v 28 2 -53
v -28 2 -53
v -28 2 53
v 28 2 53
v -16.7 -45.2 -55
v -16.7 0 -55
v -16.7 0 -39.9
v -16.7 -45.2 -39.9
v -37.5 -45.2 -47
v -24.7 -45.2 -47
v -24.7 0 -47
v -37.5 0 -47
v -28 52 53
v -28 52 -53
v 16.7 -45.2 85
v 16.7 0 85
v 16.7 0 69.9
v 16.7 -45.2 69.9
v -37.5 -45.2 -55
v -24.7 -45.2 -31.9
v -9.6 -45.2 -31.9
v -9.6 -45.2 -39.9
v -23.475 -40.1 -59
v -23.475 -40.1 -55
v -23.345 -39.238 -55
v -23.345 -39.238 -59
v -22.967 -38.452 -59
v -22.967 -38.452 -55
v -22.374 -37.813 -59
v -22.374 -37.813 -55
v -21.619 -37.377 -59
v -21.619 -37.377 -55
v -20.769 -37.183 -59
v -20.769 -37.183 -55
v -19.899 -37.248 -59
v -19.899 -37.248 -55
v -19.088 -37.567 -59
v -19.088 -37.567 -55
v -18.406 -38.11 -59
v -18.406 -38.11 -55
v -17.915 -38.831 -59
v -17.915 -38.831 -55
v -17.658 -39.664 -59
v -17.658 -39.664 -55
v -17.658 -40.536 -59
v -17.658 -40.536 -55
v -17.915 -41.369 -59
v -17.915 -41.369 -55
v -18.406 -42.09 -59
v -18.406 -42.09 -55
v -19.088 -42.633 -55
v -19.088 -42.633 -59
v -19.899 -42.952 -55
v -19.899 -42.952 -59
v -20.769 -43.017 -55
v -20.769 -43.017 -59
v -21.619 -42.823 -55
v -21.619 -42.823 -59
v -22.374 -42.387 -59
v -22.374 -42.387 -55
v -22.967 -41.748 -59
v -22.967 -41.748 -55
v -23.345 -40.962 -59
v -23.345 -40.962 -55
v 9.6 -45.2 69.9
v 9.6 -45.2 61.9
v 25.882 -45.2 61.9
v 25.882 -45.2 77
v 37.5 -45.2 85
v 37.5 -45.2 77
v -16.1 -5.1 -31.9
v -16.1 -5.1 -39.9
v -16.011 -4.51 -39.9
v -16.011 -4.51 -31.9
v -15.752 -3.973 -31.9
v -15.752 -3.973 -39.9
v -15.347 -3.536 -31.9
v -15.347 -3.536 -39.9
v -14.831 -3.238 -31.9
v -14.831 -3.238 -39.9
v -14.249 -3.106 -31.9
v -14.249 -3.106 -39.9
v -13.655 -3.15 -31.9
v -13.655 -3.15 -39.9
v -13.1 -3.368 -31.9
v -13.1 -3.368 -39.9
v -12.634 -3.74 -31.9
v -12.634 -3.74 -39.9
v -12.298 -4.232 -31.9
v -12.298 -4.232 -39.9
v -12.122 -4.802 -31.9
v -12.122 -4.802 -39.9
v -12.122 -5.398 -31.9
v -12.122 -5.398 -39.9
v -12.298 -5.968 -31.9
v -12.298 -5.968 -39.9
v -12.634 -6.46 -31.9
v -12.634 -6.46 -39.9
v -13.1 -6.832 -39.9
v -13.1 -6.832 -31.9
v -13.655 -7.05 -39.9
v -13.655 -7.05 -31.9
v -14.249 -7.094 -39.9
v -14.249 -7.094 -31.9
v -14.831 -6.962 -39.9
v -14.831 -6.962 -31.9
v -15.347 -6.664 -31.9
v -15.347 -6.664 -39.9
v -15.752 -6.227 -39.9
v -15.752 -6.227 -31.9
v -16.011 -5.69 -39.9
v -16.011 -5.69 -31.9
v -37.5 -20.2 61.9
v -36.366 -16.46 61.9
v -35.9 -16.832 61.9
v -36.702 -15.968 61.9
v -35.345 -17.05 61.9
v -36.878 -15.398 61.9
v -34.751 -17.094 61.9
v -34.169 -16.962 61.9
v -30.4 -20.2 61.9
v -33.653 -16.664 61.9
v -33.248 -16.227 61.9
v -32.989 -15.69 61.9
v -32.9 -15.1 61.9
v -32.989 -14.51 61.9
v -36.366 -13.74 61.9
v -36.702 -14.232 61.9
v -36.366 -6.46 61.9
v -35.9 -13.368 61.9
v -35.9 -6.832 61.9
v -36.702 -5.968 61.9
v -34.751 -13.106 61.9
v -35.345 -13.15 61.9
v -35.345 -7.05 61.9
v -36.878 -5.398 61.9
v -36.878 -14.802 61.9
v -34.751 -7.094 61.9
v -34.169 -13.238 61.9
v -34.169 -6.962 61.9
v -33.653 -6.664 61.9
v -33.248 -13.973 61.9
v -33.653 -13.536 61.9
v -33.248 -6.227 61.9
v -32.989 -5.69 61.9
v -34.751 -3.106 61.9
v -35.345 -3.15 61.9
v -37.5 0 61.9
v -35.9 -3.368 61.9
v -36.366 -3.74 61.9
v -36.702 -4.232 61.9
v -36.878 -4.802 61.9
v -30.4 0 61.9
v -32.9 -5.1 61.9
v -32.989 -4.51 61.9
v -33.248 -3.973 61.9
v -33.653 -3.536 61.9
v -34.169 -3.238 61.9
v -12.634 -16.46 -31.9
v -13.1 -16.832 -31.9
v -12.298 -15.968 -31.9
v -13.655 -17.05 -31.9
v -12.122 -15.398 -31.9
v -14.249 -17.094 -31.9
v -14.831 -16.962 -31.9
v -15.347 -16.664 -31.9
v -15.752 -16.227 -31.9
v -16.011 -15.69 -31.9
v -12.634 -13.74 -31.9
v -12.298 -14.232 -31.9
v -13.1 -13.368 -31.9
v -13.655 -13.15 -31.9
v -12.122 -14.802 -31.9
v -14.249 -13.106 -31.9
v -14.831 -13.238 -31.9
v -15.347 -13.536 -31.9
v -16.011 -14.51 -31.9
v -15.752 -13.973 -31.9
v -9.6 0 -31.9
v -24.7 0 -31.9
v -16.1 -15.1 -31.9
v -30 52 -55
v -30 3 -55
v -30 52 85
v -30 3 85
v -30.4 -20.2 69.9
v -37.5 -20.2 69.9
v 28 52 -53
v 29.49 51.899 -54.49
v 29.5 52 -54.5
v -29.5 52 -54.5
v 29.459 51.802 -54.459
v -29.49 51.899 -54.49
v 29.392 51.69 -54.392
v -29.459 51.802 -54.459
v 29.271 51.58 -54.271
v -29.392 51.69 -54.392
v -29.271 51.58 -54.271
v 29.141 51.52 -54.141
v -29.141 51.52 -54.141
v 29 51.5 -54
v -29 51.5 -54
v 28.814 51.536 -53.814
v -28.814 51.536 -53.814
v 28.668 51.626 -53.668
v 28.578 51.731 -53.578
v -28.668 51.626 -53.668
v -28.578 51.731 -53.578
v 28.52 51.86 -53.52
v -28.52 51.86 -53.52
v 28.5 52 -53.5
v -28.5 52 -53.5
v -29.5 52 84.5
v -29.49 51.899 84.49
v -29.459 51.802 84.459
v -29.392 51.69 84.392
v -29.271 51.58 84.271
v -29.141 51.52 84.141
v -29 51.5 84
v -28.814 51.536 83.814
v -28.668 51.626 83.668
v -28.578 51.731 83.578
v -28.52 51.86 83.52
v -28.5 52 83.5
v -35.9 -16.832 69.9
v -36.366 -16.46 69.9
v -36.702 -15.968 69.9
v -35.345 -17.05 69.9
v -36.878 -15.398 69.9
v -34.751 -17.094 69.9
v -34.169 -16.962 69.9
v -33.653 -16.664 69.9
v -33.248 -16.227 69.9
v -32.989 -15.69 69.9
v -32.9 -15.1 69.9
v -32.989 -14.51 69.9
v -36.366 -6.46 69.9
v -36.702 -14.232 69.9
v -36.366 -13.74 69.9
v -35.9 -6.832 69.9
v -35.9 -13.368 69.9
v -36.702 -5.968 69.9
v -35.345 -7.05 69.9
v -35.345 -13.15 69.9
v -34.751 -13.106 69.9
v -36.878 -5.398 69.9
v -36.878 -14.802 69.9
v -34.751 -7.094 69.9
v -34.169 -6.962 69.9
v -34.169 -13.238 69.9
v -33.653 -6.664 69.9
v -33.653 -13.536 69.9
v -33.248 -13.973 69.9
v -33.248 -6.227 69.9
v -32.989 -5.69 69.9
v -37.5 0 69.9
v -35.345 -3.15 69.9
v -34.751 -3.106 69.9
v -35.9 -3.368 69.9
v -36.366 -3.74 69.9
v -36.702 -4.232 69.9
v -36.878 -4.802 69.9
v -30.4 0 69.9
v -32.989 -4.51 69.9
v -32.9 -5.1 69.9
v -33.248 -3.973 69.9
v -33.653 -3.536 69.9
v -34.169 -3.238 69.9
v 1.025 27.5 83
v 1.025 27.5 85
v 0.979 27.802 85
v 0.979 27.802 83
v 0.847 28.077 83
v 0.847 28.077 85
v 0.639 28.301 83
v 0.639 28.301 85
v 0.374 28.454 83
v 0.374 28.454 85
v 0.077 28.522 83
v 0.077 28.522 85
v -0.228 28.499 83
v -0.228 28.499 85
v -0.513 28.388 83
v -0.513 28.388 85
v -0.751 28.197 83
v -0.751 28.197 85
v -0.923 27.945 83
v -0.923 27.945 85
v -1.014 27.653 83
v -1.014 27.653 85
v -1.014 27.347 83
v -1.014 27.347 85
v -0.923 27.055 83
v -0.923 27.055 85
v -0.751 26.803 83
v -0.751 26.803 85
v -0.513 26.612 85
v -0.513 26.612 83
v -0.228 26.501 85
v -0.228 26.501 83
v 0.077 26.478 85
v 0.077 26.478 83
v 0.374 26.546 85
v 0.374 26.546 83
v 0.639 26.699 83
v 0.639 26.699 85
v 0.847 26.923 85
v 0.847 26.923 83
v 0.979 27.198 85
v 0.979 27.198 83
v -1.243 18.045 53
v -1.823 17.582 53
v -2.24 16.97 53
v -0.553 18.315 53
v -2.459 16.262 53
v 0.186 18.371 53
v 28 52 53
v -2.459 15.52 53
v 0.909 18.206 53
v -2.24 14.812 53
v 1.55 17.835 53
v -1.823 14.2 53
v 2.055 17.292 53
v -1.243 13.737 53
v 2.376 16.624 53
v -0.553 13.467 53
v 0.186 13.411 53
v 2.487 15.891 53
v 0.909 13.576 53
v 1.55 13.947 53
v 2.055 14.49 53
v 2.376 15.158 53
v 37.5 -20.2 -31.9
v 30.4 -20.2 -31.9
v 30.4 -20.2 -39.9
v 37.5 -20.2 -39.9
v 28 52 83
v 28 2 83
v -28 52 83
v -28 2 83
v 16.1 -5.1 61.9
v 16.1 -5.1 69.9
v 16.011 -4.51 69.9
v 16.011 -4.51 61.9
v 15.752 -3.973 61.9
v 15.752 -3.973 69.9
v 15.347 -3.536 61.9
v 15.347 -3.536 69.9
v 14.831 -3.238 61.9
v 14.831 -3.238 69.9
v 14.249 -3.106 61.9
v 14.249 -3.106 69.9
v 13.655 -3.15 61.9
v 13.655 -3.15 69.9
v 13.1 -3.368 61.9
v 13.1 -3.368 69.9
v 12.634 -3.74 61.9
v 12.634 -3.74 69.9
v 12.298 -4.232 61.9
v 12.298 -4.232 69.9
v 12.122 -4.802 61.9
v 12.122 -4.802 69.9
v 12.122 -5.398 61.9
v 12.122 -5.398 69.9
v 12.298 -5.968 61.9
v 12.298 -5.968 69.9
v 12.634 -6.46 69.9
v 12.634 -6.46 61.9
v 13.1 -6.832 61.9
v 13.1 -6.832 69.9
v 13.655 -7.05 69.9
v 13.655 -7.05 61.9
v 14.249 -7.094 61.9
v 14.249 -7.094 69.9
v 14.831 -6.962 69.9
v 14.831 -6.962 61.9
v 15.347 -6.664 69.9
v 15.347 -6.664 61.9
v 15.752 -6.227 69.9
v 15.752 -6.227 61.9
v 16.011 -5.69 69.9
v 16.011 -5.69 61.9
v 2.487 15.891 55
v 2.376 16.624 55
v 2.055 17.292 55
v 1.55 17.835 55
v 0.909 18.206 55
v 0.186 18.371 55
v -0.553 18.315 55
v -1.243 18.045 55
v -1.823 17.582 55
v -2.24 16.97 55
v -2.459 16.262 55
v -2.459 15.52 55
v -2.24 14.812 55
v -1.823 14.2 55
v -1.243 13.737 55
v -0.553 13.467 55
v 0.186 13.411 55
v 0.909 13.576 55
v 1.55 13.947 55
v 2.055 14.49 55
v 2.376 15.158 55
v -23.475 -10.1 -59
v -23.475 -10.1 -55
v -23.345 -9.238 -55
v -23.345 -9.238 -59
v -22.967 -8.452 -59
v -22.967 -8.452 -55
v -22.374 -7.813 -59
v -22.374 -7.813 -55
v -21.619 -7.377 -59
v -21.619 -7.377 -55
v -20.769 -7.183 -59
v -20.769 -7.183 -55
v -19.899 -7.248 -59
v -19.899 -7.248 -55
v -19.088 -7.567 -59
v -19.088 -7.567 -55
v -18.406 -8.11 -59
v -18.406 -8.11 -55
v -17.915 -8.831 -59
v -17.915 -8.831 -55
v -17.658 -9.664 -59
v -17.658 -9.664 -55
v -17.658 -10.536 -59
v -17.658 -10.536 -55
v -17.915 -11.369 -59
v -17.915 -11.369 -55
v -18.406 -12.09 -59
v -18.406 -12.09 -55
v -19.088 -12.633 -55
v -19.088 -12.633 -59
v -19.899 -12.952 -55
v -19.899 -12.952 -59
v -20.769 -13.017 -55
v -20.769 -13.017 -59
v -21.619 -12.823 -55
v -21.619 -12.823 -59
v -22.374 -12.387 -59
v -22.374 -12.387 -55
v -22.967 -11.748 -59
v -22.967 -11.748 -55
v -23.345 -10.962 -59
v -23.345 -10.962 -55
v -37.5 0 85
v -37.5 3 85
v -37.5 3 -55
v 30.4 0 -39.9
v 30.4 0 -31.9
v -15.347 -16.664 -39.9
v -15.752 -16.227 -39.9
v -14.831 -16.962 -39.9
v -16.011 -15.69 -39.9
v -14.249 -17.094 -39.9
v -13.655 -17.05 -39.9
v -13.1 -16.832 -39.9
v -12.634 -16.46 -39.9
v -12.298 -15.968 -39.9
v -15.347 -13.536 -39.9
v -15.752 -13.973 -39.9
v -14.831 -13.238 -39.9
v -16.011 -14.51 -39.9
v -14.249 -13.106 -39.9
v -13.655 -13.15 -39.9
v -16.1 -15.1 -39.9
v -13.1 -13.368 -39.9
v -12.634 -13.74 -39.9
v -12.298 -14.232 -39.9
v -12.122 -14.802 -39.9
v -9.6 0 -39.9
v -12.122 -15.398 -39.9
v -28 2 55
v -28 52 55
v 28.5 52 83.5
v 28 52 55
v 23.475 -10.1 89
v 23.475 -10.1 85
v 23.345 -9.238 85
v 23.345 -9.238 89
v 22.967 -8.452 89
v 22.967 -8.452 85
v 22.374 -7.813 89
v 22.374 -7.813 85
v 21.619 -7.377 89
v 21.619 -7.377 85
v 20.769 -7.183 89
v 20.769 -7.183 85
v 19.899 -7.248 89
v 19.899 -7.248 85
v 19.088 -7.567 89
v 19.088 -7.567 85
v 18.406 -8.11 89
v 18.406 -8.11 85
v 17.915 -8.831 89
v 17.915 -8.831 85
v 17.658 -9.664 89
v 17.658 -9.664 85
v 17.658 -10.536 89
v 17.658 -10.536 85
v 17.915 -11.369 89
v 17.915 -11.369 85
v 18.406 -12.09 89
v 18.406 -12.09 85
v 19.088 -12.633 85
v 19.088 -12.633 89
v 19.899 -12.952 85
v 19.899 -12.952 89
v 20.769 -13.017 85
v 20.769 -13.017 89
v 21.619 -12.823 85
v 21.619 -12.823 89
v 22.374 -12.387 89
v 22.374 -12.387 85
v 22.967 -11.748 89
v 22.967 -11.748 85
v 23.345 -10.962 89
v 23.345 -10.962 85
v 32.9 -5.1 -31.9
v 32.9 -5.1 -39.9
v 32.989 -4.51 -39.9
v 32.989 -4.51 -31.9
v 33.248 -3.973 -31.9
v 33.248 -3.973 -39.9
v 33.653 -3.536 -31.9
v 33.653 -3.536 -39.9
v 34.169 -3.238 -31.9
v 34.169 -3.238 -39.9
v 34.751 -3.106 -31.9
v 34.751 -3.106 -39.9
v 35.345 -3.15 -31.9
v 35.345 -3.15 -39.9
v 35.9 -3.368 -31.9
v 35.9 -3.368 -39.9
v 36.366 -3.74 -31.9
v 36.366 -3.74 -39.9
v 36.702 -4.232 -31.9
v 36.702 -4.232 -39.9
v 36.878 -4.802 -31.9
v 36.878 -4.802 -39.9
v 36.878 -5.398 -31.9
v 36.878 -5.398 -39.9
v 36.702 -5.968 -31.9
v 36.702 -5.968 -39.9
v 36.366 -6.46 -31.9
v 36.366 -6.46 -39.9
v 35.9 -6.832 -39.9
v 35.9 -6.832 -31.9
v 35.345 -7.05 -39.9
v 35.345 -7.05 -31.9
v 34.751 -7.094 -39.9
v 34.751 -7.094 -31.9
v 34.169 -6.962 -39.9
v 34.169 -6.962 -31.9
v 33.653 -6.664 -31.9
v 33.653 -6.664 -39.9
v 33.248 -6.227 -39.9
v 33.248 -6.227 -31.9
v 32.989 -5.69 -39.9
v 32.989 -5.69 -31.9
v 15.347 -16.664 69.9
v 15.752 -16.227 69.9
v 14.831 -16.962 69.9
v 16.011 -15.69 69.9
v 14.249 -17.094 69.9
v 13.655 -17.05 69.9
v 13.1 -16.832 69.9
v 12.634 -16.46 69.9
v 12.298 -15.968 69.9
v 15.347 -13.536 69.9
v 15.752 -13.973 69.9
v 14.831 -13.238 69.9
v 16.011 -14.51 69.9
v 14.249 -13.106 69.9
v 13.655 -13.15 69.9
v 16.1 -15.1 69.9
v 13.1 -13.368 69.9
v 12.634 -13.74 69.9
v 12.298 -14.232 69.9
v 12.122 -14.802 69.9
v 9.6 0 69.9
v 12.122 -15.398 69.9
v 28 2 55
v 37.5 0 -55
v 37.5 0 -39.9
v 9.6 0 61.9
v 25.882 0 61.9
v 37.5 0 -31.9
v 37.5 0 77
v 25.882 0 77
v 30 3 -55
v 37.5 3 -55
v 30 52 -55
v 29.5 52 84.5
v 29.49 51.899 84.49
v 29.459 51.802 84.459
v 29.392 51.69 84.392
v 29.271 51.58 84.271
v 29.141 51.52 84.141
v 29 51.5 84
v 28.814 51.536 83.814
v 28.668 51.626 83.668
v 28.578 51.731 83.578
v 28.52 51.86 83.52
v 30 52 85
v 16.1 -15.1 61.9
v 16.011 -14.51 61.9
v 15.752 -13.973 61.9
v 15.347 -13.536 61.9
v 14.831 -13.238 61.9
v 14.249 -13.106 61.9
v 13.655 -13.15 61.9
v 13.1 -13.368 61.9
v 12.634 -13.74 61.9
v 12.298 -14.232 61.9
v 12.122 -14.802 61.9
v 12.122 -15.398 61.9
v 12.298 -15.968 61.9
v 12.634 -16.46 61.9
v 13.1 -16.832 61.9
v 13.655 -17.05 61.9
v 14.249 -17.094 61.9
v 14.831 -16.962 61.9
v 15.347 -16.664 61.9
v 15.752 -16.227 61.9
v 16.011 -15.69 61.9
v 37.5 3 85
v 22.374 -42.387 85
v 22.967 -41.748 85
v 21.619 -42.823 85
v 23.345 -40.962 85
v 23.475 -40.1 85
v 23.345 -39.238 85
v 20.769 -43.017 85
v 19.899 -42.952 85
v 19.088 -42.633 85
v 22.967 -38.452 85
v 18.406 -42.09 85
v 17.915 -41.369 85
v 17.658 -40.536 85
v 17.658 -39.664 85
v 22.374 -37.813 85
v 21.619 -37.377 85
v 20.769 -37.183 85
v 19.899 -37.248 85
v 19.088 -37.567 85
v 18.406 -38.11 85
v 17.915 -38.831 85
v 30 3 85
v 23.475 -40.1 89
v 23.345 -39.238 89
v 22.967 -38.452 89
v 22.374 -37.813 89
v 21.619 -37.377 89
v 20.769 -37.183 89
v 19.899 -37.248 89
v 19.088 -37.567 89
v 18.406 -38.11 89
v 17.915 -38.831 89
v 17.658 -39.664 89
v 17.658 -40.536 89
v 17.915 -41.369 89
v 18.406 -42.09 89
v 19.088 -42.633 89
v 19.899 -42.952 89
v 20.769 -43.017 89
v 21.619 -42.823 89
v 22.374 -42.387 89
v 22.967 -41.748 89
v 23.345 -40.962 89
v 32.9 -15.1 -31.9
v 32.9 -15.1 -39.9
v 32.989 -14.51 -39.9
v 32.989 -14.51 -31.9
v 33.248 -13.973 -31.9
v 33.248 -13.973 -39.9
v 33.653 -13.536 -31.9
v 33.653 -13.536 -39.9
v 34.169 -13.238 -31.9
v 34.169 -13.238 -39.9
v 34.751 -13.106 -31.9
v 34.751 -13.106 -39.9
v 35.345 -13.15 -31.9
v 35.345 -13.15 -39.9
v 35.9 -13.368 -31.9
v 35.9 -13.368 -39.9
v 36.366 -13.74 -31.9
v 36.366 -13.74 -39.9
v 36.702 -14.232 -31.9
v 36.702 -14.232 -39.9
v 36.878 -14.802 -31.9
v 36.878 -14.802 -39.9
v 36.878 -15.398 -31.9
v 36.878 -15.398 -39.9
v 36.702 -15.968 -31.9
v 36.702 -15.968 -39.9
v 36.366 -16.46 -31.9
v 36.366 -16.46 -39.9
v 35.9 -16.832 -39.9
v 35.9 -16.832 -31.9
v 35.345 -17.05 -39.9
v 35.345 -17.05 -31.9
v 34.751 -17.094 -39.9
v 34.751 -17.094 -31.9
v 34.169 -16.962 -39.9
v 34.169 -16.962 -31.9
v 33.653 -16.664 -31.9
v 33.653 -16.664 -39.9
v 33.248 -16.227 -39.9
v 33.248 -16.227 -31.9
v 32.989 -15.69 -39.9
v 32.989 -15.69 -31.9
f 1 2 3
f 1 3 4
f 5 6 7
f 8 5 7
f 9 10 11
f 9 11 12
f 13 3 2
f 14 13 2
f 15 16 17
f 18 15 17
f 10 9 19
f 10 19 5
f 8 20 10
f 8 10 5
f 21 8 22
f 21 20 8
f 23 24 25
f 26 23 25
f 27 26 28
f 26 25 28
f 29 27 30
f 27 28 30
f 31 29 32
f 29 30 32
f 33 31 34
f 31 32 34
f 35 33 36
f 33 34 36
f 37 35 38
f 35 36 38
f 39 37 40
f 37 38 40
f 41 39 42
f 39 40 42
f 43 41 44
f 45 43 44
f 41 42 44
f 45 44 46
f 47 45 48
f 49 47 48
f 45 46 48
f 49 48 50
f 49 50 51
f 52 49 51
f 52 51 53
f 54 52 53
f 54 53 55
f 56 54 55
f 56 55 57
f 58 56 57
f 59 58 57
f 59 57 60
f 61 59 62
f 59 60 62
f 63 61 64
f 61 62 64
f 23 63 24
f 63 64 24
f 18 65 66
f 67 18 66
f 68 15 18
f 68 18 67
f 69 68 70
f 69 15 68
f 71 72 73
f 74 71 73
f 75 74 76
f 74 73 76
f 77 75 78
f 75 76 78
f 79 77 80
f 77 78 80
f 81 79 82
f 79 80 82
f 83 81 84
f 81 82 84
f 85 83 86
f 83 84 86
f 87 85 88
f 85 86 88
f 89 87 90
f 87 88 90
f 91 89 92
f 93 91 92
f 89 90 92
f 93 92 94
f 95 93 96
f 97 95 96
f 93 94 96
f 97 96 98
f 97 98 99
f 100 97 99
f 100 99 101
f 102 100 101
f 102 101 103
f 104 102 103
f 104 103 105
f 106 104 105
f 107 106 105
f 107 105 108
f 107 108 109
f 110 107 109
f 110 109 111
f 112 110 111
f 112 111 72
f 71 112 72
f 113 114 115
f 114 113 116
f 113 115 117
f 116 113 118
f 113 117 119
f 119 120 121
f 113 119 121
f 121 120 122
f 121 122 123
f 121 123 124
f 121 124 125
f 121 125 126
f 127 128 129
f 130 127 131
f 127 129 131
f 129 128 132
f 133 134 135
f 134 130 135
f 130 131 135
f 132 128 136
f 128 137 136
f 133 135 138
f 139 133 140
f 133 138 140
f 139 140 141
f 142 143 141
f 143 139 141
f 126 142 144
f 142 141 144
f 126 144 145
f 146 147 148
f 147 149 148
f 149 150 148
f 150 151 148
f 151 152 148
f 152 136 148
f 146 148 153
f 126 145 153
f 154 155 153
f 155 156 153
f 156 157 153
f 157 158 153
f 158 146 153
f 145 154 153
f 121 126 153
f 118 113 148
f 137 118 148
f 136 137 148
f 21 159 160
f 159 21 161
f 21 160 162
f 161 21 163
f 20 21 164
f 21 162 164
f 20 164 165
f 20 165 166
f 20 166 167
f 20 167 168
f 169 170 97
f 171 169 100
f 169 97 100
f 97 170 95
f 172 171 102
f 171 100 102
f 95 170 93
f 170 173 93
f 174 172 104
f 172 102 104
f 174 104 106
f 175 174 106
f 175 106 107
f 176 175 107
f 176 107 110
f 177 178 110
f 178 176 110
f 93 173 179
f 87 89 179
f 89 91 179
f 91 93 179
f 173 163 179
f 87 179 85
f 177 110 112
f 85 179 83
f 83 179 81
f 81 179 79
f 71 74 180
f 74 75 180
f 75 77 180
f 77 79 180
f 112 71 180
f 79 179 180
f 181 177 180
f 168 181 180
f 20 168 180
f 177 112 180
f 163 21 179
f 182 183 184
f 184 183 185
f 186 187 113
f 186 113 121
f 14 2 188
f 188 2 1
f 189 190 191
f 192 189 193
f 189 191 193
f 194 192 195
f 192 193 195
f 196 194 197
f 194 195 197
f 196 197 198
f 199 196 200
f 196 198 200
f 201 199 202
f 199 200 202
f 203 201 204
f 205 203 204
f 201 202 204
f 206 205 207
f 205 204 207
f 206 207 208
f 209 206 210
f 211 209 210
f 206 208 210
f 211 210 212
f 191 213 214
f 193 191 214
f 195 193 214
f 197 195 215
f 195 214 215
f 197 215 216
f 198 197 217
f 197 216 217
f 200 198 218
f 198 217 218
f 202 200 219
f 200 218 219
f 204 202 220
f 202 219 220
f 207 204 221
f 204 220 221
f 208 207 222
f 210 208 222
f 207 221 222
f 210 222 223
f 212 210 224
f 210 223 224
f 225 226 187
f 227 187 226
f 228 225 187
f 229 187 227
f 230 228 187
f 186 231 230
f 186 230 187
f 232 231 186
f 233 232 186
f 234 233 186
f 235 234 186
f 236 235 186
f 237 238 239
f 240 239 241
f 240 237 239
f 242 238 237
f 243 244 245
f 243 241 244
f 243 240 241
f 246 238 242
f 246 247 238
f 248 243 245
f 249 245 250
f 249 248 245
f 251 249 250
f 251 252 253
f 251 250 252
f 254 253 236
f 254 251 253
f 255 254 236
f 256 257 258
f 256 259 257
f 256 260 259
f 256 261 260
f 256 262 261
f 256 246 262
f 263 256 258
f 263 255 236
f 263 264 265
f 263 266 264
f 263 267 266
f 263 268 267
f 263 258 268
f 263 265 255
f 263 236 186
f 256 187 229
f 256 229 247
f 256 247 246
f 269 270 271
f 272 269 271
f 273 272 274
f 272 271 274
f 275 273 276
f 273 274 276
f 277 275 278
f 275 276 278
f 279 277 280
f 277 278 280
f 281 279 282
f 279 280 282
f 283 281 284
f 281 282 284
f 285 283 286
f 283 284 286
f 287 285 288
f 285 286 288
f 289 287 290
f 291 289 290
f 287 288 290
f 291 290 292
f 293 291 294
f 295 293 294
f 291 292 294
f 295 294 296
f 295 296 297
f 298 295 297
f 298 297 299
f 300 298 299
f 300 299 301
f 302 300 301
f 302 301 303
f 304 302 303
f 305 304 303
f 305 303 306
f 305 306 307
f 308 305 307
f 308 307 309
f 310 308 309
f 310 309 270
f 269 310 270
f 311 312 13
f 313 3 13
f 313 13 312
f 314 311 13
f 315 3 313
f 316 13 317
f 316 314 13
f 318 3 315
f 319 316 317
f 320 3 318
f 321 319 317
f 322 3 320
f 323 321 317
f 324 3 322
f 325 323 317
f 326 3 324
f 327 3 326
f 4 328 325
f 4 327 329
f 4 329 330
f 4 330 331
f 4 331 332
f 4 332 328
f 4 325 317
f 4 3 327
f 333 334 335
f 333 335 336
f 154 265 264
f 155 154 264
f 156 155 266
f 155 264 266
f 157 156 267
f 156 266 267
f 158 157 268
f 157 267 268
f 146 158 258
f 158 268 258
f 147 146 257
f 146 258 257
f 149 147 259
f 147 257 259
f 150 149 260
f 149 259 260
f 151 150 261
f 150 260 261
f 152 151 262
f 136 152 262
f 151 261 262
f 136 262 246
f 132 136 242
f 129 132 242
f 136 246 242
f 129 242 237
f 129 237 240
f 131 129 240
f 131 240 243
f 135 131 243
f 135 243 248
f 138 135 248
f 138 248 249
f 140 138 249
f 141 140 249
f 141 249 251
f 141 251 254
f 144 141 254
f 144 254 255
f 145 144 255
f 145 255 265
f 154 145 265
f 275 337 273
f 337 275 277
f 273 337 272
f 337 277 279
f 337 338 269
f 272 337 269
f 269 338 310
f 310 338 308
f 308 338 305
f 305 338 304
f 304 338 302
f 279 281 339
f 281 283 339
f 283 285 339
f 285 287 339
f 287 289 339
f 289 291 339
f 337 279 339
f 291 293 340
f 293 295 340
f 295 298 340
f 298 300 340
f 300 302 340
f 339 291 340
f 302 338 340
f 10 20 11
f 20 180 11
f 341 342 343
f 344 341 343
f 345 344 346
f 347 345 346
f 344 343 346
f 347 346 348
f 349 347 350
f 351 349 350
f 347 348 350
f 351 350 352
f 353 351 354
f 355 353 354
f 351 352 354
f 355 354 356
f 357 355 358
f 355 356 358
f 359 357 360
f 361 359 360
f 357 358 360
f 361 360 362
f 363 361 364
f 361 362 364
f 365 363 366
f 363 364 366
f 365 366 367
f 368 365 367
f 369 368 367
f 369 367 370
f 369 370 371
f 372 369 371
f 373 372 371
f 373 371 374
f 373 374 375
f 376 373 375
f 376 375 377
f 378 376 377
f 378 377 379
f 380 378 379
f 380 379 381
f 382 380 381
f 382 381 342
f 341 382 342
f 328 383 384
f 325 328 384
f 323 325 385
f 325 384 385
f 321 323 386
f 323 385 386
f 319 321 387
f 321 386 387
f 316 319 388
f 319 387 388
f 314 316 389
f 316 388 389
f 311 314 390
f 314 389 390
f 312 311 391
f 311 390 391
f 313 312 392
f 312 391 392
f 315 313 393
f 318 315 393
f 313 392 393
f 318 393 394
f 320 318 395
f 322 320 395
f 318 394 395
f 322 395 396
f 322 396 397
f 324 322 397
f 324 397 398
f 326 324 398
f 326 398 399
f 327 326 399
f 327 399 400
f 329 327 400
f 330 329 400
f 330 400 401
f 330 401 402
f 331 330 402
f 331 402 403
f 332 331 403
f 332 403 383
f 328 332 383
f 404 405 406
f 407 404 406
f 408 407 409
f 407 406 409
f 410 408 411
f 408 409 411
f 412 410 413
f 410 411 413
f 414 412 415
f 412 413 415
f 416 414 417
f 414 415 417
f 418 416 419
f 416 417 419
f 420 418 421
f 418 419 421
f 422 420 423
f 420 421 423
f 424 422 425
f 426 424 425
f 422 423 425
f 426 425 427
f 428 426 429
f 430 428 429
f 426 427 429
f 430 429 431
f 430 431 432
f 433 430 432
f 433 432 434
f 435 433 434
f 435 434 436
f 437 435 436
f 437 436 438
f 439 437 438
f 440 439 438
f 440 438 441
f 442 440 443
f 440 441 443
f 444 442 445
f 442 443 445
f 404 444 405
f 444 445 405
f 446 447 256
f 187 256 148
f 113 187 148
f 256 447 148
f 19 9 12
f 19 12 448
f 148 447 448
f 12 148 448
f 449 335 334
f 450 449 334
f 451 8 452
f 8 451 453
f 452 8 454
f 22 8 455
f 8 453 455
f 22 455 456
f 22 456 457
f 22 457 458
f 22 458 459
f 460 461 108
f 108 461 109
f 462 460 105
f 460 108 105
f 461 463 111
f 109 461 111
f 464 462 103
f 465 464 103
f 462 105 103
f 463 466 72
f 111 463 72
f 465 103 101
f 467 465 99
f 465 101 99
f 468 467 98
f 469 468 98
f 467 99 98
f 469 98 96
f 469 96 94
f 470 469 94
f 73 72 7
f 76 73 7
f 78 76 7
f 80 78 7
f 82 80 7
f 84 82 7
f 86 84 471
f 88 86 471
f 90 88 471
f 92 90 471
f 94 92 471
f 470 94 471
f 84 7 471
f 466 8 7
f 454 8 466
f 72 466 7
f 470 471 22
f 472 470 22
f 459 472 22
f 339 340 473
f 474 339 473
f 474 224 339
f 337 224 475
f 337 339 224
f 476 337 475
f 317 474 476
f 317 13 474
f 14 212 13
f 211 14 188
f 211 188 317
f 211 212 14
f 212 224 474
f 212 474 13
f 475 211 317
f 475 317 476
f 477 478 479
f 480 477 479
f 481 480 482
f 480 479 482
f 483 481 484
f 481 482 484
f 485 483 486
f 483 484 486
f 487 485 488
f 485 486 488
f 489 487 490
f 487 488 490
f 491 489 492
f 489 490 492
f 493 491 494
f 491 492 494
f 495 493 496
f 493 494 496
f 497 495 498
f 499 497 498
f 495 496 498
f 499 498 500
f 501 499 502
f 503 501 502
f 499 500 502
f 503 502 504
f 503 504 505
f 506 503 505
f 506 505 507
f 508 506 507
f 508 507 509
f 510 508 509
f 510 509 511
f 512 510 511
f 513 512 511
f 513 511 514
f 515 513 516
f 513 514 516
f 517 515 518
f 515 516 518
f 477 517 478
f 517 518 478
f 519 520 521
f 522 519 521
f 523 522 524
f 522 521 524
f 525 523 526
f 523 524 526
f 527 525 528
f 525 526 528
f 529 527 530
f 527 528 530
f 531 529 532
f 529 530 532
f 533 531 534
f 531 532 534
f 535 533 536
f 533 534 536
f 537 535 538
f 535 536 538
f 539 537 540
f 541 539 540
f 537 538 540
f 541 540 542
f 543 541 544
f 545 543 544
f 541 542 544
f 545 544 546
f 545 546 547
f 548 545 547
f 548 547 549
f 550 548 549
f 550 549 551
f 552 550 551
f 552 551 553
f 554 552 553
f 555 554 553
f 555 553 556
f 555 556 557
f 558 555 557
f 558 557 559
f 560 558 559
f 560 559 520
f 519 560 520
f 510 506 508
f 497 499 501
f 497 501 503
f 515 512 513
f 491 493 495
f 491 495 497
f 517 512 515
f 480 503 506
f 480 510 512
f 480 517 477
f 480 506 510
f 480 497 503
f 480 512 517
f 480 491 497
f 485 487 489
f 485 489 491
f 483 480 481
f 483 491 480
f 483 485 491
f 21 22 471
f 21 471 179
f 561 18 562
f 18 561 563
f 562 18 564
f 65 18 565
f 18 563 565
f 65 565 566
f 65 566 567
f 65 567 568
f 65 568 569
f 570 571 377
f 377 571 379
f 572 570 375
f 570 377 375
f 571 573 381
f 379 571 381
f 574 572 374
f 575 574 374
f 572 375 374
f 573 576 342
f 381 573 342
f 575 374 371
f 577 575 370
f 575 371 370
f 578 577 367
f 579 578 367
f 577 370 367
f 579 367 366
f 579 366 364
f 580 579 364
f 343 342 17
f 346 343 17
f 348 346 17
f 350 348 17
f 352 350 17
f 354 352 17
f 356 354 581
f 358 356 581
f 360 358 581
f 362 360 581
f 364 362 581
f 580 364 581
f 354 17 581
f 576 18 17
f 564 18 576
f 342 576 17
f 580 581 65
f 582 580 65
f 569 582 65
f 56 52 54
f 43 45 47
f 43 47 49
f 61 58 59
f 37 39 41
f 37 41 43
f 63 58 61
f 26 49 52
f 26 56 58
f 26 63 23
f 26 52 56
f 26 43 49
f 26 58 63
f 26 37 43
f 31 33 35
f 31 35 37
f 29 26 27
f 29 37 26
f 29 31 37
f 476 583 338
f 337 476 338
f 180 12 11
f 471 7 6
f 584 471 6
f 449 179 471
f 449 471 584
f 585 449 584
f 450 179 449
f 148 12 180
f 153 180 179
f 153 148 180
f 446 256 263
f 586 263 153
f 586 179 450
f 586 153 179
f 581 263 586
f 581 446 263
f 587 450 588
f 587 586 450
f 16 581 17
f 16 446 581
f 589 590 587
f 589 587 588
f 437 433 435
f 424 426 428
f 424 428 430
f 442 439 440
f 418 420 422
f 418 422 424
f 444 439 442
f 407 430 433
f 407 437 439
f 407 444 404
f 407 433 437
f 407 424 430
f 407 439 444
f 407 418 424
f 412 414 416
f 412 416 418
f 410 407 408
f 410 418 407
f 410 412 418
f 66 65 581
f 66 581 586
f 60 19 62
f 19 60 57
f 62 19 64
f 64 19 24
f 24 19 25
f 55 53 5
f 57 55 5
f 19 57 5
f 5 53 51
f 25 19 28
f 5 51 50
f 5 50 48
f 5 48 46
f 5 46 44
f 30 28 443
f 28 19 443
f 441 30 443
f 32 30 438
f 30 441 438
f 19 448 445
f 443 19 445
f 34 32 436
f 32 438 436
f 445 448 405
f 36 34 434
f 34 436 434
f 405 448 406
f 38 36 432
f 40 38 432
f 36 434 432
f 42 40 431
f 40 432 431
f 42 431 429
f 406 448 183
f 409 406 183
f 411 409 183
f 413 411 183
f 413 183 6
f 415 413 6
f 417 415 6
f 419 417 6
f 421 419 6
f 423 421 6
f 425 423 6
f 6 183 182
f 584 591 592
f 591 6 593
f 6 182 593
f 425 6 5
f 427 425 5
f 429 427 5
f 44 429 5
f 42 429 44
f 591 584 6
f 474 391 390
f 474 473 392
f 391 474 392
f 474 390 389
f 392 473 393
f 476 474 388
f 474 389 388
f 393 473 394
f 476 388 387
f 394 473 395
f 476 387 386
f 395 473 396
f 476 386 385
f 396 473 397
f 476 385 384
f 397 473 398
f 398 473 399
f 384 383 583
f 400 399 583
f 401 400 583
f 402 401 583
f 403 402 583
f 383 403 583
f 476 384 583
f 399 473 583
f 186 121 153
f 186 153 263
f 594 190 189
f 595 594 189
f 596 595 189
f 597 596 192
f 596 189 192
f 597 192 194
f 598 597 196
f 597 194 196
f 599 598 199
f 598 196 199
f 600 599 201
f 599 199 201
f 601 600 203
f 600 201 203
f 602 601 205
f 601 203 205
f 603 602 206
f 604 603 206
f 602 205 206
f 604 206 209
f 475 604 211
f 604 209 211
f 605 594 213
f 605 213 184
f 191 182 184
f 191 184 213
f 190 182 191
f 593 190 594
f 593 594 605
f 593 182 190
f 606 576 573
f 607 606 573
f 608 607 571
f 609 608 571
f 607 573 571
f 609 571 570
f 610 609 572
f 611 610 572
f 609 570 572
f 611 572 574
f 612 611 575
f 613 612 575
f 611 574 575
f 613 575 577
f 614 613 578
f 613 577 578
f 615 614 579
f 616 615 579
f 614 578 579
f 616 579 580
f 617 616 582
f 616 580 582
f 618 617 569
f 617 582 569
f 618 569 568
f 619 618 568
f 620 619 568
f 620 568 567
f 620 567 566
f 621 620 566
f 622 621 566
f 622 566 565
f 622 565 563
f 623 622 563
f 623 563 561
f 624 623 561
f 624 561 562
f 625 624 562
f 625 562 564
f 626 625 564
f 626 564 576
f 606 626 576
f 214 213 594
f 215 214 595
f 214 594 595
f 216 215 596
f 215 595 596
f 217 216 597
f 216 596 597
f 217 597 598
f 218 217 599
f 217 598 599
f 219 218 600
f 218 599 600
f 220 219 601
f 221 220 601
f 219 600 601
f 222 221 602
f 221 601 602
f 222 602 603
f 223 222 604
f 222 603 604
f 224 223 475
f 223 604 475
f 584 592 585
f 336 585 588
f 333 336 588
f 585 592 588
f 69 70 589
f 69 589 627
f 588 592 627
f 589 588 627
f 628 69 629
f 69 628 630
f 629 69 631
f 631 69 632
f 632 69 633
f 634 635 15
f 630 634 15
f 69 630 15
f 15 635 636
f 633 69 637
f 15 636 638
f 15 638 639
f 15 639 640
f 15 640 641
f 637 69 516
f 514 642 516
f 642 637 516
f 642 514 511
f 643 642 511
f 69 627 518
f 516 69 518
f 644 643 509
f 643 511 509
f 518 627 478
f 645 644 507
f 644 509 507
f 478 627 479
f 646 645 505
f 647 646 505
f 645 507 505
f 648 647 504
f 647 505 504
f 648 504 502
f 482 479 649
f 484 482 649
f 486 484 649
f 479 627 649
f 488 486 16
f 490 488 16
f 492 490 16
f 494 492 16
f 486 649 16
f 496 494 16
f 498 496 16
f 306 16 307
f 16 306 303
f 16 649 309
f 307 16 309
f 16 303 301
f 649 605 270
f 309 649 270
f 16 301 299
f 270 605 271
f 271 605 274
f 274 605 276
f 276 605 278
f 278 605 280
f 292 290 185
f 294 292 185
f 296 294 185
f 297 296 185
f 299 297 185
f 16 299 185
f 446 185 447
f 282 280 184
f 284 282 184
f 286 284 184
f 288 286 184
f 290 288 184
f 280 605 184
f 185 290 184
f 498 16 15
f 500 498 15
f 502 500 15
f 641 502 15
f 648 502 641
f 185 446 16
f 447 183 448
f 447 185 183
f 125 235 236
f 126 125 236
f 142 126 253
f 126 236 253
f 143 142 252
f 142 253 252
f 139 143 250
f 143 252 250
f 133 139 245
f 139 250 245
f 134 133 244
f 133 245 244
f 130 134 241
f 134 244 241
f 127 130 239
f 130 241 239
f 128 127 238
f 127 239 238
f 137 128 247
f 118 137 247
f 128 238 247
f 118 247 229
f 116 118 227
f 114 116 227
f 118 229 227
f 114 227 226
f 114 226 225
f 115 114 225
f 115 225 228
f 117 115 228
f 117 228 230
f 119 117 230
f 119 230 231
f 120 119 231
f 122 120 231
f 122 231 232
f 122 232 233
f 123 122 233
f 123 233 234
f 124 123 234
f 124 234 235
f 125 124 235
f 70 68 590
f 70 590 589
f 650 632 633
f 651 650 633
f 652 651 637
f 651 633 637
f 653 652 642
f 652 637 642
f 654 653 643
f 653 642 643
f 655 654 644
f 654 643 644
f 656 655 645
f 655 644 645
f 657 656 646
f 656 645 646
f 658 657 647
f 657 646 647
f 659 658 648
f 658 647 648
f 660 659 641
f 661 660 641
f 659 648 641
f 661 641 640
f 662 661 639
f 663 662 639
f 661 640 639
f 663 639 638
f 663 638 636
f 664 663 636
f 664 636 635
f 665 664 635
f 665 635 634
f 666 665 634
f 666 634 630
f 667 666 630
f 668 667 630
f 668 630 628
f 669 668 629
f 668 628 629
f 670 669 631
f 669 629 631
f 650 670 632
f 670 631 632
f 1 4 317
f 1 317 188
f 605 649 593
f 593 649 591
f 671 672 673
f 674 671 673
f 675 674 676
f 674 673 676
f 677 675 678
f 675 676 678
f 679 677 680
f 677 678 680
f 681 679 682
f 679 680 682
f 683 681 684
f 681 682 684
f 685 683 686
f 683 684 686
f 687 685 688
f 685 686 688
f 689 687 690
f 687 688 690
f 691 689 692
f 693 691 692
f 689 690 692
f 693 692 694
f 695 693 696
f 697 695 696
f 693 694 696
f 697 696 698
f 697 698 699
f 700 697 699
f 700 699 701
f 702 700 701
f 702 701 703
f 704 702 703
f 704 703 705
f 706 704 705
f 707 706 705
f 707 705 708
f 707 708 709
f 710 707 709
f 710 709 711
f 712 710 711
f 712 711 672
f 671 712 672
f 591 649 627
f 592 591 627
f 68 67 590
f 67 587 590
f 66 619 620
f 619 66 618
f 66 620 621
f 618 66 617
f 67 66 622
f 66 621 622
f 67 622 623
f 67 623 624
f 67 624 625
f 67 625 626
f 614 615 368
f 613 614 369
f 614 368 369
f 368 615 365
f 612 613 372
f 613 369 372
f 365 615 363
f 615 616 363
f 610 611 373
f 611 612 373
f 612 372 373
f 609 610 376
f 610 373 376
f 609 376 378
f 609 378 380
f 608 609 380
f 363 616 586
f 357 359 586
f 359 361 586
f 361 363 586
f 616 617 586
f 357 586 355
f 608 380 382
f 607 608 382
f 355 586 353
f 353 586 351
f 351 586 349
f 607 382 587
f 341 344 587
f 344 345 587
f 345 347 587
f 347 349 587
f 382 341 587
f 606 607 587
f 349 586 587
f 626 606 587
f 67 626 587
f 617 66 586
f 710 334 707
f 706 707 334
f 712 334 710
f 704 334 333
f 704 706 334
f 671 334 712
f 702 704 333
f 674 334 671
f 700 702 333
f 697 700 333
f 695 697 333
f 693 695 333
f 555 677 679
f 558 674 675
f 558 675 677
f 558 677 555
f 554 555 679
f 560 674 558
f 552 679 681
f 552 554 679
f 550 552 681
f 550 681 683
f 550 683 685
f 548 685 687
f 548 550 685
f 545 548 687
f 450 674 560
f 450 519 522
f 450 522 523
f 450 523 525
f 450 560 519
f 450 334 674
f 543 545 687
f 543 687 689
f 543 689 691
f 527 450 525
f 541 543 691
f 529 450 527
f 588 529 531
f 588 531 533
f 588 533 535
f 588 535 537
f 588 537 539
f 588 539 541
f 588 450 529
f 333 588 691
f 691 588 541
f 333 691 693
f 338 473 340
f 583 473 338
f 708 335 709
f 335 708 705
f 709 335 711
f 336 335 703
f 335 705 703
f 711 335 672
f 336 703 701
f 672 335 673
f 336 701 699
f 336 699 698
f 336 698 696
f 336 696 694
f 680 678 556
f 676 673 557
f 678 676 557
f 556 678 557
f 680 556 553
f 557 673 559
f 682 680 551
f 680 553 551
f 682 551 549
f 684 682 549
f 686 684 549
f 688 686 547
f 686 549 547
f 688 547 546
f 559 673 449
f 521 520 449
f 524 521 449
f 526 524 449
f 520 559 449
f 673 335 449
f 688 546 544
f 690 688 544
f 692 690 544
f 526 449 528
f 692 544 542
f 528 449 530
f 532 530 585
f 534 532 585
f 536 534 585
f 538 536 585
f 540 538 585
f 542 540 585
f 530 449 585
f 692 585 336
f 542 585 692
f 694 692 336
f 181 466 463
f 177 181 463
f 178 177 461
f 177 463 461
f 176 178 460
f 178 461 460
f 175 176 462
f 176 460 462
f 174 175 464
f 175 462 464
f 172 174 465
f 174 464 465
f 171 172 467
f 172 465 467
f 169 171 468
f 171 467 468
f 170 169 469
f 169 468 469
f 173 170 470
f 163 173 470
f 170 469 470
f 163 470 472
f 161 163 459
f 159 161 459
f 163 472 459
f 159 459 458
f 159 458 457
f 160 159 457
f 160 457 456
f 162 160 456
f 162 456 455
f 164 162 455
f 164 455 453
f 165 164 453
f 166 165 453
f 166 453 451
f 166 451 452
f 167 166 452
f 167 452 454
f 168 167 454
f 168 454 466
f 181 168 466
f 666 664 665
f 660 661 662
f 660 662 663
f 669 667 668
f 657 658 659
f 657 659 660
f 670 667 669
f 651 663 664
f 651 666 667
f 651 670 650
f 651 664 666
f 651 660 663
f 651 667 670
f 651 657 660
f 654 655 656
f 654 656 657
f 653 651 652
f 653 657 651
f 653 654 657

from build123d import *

# Parameters (mm, degrees)
SKETCH1_W            = 60
SKETCH1_H            = 110
BOSS_EXTRUDE1_DEPTH  = 2
SKETCH2_W            = 60
SKETCH2_H            = 110
SKETCH2_W_2          = 56
SKETCH2_H_2          = 106
BOSS_EXTRUDE2_DEPTH  = 50
SKETCH3_W            = 60
SKETCH3_H            = 30
BOSS_EXTRUDE3_DEPTH  = 2
BOSS_EXTRUDE4_DEPTH  = 50
SKETCH5_R            = 2.486759959
CUT_EXTRUDE1_DEPTH   = 30
CUT_SWEEP1_PROFILE_R = 0.5
SKETCH43_W           = 7.5
SKETCH43_H           = 140
BOSS_EXTRUDE7_DEPTH  = 3
SKETCH55_W           = 7.1
SKETCH55_H           = 8
BOSS_EXTRUDE10_DEPTH = 20.2
SKETCH56_R           = 2
CUT_EXTRUDE3_DEPTH   = 46.2
SKETCH59_R           = 2
CUT_EXTRUDE4_DEPTH   = 49.2
SKETCH60_R           = 2.925
BOSS_EXTRUDE11_DEPTH = 4
SKETCH61_R           = 2.925
BOSS_EXTRUDE12_DEPTH = 4
SKETCH62_R           = 1.025
CUT_EXTRUDE5_DEPTH   = 10
BOSS_EXTRUDE13_DEPTH = 25
SKETCH64_R           = 2.925
BOSS_EXTRUDE14_DEPTH = 4
BOSS_EXTRUDE15_DEPTH = 25
SKETCH66_R           = 2.925
BOSS_EXTRUDE16_DEPTH = 4


with BuildPart() as part:
    # Sketch1 → Boss-Extrude1 (new body)
    with BuildSketch(Plane(origin=(0, 0, 0), x_dir=(1, 0, 0), z_dir=(0, 1, 0))):
        Rectangle(SKETCH1_W, SKETCH1_H)
    extrude(amount=BOSS_EXTRUDE1_DEPTH)

    # Sketch2 → Boss-Extrude2 (add)
    with BuildSketch(Plane(origin=(0, 2, 0), x_dir=(1, 0, 0), z_dir=(0, 1, 0))):
        Rectangle(SKETCH2_W, SKETCH2_H)
        Rectangle(SKETCH2_W_2, SKETCH2_H_2, mode=Mode.SUBTRACT)
    extrude(amount=BOSS_EXTRUDE2_DEPTH)

    # Sketch3 → Boss-Extrude3 (add)
    with BuildSketch(Plane(origin=(0, 0, 0), x_dir=(1, 0, 0), z_dir=(0, 1, 0))):
        with Locations((0, -70)):
            Rectangle(SKETCH3_W, SKETCH3_H)
    extrude(amount=BOSS_EXTRUDE3_DEPTH)

    # Sketch4 → Boss-Extrude4 (add)
    with BuildSketch(Plane(origin=(0, 2, 0), x_dir=(1, 0, 0), z_dir=(0, 1, 0))):
        Polygon((-28, -55), (-30, -55), (-30, -85), (30, -85), (30, -55), (28, -55), (28, -83), (-28, -83), align=None)
    extrude(amount=BOSS_EXTRUDE4_DEPTH)

    # Sketch5 → Cut-Extrude1 (cut)
    with BuildSketch(Plane.XY.offset(55)):
        with Locations((0, 15.890944925)):
            Circle(SKETCH5_R)
    extrude(amount=-CUT_EXTRUDE1_DEPTH, mode=Mode.SUBTRACT)

    # Cut-Sweep1: sweep along a path in Sketch6
    with BuildLine(Plane(origin=(0, 52, 0), x_dir=(1, 0, 0), z_dir=(0, 1, 0))) as cut_sweep1_path:
        Line((-29, 54), (-29, -84))
        Line((-29, -84), (29, -84))
        Line((29, -84), (29, 54))
        Line((29, 54), (-29, 54))
    # Cut-Sweep1 profile (on start of the path) → Cut-Sweep1 (sweep, cut)
    with BuildSketch(Plane(origin=(-29, 52, -54), x_dir=(1, 0, 0), z_dir=(0, 0, 1))):
        Circle(CUT_SWEEP1_PROFILE_R)
    sweep(path=cut_sweep1_path.line, transition=Transition.RIGHT, mode=Mode.SUBTRACT)

    # Sketch43 → Boss-Extrude7 (add)
    with BuildSketch(Plane.XZ):
        with Locations((33.75, 15)):
            Rectangle(SKETCH43_W, SKETCH43_H)
        Polygon((-30, -55), (-37.5, -55), (-37.5, 85), (-30, 85), (-30, 55), align=None)
    extrude(amount=-BOSS_EXTRUDE7_DEPTH)

    # Sketch55 → Boss-Extrude10 (add)
    with BuildSketch(Plane.XZ):
        with Locations((-33.95, 65.9)):
            Rectangle(SKETCH55_W, SKETCH55_H)
        Polygon((9.6, 69.9), (9.6, 61.9), (25.881976889, 61.9), (25.881976889, 77), (37.5, 77), (37.5, 85), (16.7, 85), (16.7, 69.9), align=None)
        with Locations((33.95, -35.9)):
            Rectangle(SKETCH55_W, SKETCH55_H)
        Polygon((-9.6, -39.9), (-9.6, -31.9), (-24.7, -31.9), (-24.7, -47), (-37.5, -47), (-37.5, -55), (-16.7, -55), (-16.7, -39.9), align=None)
    extrude(amount=BOSS_EXTRUDE10_DEPTH)

    # Sketch56 → Cut-Extrude3 (cut)
    with BuildSketch(Plane.XY.offset(85)):
        with Locations((-34.9, -15.1)):
            Circle(SKETCH56_R)
        with Locations((-34.9, -5.1)):
            Circle(SKETCH56_R)
        with Locations((14.1, -15.1)):
            Circle(SKETCH56_R)
        with Locations((14.1, -5.1)):
            Circle(SKETCH56_R)
    extrude(amount=-CUT_EXTRUDE3_DEPTH, mode=Mode.SUBTRACT)

    # Sketch59 → Cut-Extrude4 (cut)
    with BuildSketch(Plane(origin=(0, 0, -55), x_dir=(-1, 0, 0), z_dir=(0, 0, -1))):
        with Locations((-34.9, -15.1)):
            Circle(SKETCH59_R)
        with Locations((-34.9, -5.1)):
            Circle(SKETCH59_R)
        with Locations((14.1, -5.1)):
            Circle(SKETCH59_R)
        with Locations((14.1, -15.1)):
            Circle(SKETCH59_R)
    extrude(amount=-CUT_EXTRUDE4_DEPTH, mode=Mode.SUBTRACT)

    # Sketch60 → Boss-Extrude11 (add)
    with BuildSketch(Plane(origin=(0, 0, -55), x_dir=(-1, 0, 0), z_dir=(0, 0, -1))):
        with Locations((20.55, -10.1)):
            Circle(SKETCH60_R)
    extrude(amount=BOSS_EXTRUDE11_DEPTH)

    # Sketch61 → Boss-Extrude12 (add)
    with BuildSketch(Plane.XY.offset(85)):
        with Locations((20.55, -10.1)):
            Circle(SKETCH61_R)
    extrude(amount=BOSS_EXTRUDE12_DEPTH)

    # Sketch62 → Cut-Extrude5 (cut)
    with BuildSketch(Plane.XY.offset(85)):
        with Locations((0, 27.5)):
            Circle(SKETCH62_R)
    extrude(amount=-CUT_EXTRUDE5_DEPTH, mode=Mode.SUBTRACT)

    # Sketch63 → Boss-Extrude13 (add)
    with BuildSketch(Plane.XZ.offset(20.2)):
        Polygon((16.7, 69.9), (9.6, 69.9), (9.6, 61.9), (25.881976889, 61.9), (25.881976889, 77), (37.5, 77), (37.5, 85), (16.7, 85), align=None)
    extrude(amount=BOSS_EXTRUDE13_DEPTH)

    # Sketch64 → Boss-Extrude14 (add)
    with BuildSketch(Plane.XY.offset(85)):
        with Locations((20.55, -40.1)):
            Circle(SKETCH64_R)
    extrude(amount=BOSS_EXTRUDE14_DEPTH)

    # Sketch65 → Boss-Extrude15 (add)
    with BuildSketch(Plane.XZ.offset(20.2)):
        Polygon((-16.7, -39.9), (-9.6, -39.9), (-9.6, -31.9), (-24.7, -31.9), (-24.7, -47), (-37.5, -47), (-37.5, -55), (-16.7, -55), align=None)
    extrude(amount=BOSS_EXTRUDE15_DEPTH)

    # Sketch66 → Boss-Extrude16 (add)
    with BuildSketch(Plane(origin=(0, 0, -55), x_dir=(-1, 0, 0), z_dir=(0, 0, -1))):
        with Locations((20.55, -40.1)):
            Circle(SKETCH66_R)
    extrude(amount=BOSS_EXTRUDE16_DEPTH)


solid = part.part
